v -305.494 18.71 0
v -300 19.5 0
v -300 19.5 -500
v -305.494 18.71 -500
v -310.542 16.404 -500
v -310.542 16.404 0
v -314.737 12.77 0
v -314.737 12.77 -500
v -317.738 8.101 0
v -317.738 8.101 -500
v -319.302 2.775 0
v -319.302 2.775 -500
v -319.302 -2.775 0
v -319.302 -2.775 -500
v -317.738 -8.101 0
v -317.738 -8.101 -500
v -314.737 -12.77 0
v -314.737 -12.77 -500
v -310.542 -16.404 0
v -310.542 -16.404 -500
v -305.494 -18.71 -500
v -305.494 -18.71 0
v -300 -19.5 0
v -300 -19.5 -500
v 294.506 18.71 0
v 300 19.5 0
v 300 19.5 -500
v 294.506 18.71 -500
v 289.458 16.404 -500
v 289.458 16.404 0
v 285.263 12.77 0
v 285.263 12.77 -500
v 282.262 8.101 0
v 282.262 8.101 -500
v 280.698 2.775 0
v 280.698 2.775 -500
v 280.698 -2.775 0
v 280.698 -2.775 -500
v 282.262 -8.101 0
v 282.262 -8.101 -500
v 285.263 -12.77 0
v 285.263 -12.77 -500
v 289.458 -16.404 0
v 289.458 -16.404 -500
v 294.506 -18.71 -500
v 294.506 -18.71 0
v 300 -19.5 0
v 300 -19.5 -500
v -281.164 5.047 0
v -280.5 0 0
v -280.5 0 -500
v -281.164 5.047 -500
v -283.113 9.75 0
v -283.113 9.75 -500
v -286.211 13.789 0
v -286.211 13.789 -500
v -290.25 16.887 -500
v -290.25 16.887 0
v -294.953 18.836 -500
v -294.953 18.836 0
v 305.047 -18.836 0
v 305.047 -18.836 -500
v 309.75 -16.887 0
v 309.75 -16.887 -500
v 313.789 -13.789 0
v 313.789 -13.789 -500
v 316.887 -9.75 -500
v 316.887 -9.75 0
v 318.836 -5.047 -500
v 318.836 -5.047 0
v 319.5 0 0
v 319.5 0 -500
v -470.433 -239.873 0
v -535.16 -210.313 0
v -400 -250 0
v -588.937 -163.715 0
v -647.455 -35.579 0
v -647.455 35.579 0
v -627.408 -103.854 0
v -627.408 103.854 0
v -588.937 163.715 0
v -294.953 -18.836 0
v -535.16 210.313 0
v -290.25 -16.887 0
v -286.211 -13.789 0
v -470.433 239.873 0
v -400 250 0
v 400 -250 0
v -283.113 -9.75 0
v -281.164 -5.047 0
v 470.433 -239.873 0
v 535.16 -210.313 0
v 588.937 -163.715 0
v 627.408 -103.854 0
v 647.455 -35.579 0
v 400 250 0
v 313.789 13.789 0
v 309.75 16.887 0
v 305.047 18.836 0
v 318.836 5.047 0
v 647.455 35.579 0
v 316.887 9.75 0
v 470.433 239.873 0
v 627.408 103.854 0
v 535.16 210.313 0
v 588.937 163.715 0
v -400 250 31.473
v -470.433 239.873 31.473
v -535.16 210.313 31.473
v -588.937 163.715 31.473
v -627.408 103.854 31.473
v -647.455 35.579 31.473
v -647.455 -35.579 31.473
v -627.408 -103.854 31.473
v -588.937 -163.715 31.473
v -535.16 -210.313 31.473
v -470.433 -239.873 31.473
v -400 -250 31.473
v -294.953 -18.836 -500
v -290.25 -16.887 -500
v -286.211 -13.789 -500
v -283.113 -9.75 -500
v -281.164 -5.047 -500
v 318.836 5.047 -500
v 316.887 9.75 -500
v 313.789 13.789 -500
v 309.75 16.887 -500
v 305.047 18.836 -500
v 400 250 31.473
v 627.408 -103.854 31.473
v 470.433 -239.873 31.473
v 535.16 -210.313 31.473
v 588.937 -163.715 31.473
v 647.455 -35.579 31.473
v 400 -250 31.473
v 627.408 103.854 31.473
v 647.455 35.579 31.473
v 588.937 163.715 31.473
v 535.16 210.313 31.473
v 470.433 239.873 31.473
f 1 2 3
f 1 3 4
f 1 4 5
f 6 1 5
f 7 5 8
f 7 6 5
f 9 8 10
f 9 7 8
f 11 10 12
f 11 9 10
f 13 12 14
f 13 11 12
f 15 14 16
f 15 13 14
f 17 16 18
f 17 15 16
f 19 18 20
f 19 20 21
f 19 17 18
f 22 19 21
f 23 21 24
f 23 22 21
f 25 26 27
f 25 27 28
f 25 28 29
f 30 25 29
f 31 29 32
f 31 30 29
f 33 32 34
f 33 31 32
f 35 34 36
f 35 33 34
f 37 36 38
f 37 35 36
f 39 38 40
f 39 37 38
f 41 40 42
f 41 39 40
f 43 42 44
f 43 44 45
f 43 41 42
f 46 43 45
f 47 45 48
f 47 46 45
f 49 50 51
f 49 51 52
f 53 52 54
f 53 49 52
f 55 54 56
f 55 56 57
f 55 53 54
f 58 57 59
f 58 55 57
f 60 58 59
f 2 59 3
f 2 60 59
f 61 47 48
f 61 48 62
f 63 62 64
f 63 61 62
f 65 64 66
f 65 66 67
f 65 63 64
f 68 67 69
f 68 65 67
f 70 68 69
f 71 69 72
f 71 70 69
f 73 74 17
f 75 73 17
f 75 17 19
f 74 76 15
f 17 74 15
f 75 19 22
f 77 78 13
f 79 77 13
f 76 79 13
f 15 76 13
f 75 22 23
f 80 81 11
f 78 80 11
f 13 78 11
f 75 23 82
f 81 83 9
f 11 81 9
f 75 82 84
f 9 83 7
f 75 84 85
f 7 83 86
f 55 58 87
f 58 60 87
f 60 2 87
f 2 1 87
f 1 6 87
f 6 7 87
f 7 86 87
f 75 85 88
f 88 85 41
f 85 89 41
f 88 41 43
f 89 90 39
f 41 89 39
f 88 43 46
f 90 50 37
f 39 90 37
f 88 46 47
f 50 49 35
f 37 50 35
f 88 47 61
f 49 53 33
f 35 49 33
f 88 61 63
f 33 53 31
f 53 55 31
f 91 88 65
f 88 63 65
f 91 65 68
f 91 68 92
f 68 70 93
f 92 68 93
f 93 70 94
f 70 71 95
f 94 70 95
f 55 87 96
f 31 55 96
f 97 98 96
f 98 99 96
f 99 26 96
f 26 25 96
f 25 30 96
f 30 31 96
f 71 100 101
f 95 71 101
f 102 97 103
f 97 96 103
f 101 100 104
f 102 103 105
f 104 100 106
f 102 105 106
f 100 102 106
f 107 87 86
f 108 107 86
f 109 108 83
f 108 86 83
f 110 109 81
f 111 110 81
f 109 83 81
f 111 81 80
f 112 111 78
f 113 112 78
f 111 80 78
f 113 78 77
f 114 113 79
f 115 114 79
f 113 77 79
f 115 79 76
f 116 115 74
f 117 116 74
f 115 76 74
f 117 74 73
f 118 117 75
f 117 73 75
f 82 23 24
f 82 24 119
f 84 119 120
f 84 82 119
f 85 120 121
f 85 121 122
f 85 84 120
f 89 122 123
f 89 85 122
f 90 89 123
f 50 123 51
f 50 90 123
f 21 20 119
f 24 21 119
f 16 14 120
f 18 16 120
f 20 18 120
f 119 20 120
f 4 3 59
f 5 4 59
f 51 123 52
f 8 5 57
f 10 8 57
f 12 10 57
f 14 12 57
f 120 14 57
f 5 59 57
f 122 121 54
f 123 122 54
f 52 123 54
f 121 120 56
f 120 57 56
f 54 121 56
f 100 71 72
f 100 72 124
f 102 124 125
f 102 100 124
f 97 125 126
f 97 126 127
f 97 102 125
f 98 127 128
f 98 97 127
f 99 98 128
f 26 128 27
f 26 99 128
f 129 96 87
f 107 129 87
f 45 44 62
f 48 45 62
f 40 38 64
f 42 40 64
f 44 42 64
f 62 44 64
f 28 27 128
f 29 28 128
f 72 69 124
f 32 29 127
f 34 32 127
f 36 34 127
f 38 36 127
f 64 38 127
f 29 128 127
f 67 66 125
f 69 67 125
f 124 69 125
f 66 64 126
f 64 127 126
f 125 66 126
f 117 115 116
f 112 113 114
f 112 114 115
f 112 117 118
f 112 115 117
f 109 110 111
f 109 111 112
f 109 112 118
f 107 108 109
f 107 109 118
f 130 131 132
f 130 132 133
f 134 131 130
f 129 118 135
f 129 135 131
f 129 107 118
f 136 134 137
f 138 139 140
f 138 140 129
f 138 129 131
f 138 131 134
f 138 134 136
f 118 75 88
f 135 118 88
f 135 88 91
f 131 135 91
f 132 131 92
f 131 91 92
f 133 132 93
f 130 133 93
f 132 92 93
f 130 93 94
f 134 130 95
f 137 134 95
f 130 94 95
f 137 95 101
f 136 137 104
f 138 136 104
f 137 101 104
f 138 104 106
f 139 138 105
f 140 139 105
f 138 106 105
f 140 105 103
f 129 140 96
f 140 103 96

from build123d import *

# Parameters (mm, degrees)
F0_W     = 600
F0_H     = 500
F1_DEPTH = 31.473145
F3_DEPTH = 500


with BuildPart() as f1:
    # F0 (on Top) → F1 (new body)
    with BuildSketch(Plane.XY):
        with BuildLine():
            Line((-300, -250), (-300, 250))
            Line((-300, 250), (-400, 250))
            ThreePointArc((-400, 250), (-650, 0), (-400, -250))
            Line((-400, -250), (-300, -250))
        make_face()
        Rectangle(F0_W, F0_H)
        with BuildLine():
            Line((400, 250), (300, 250))
            Line((300, 250), (300, -250))
            Line((300, -250), (400, -250))
            ThreePointArc((400, -250), (650, 0), (400, 250))
        make_face()
    extrude(amount=F1_DEPTH)

    # F2 (on Top) → F3 (join)
    with BuildSketch(Plane.XY):
        with BuildLine():
            ThreePointArc((-280.5, 0), (-286.211418, 13.788582), (-300, 19.5))
            Line((-300, 19.5), (-300, -19.5))
            ThreePointArc((-300, -19.5), (-286.211418, -13.788582), (-280.5, 0))
        make_face()
        with BuildLine():
            Line((-300, -19.5), (-300, 19.5))
            ThreePointArc((-300, 19.5), (-319.5, 0), (-300, -19.5))
        make_face()
        with BuildLine():
            ThreePointArc((319.5, 0), (313.788582, 13.788582), (300, 19.5))
            Line((300, 19.5), (300, -19.5))
            ThreePointArc((300, -19.5), (313.788582, -13.788582), (319.5, 0))
        make_face()
        with BuildLine():
            Line((300, -19.5), (300, 19.5))
            ThreePointArc((300, 19.5), (280.5, 0), (300, -19.5))
        make_face()
    extrude(amount=-F3_DEPTH)


solid = f1.part
